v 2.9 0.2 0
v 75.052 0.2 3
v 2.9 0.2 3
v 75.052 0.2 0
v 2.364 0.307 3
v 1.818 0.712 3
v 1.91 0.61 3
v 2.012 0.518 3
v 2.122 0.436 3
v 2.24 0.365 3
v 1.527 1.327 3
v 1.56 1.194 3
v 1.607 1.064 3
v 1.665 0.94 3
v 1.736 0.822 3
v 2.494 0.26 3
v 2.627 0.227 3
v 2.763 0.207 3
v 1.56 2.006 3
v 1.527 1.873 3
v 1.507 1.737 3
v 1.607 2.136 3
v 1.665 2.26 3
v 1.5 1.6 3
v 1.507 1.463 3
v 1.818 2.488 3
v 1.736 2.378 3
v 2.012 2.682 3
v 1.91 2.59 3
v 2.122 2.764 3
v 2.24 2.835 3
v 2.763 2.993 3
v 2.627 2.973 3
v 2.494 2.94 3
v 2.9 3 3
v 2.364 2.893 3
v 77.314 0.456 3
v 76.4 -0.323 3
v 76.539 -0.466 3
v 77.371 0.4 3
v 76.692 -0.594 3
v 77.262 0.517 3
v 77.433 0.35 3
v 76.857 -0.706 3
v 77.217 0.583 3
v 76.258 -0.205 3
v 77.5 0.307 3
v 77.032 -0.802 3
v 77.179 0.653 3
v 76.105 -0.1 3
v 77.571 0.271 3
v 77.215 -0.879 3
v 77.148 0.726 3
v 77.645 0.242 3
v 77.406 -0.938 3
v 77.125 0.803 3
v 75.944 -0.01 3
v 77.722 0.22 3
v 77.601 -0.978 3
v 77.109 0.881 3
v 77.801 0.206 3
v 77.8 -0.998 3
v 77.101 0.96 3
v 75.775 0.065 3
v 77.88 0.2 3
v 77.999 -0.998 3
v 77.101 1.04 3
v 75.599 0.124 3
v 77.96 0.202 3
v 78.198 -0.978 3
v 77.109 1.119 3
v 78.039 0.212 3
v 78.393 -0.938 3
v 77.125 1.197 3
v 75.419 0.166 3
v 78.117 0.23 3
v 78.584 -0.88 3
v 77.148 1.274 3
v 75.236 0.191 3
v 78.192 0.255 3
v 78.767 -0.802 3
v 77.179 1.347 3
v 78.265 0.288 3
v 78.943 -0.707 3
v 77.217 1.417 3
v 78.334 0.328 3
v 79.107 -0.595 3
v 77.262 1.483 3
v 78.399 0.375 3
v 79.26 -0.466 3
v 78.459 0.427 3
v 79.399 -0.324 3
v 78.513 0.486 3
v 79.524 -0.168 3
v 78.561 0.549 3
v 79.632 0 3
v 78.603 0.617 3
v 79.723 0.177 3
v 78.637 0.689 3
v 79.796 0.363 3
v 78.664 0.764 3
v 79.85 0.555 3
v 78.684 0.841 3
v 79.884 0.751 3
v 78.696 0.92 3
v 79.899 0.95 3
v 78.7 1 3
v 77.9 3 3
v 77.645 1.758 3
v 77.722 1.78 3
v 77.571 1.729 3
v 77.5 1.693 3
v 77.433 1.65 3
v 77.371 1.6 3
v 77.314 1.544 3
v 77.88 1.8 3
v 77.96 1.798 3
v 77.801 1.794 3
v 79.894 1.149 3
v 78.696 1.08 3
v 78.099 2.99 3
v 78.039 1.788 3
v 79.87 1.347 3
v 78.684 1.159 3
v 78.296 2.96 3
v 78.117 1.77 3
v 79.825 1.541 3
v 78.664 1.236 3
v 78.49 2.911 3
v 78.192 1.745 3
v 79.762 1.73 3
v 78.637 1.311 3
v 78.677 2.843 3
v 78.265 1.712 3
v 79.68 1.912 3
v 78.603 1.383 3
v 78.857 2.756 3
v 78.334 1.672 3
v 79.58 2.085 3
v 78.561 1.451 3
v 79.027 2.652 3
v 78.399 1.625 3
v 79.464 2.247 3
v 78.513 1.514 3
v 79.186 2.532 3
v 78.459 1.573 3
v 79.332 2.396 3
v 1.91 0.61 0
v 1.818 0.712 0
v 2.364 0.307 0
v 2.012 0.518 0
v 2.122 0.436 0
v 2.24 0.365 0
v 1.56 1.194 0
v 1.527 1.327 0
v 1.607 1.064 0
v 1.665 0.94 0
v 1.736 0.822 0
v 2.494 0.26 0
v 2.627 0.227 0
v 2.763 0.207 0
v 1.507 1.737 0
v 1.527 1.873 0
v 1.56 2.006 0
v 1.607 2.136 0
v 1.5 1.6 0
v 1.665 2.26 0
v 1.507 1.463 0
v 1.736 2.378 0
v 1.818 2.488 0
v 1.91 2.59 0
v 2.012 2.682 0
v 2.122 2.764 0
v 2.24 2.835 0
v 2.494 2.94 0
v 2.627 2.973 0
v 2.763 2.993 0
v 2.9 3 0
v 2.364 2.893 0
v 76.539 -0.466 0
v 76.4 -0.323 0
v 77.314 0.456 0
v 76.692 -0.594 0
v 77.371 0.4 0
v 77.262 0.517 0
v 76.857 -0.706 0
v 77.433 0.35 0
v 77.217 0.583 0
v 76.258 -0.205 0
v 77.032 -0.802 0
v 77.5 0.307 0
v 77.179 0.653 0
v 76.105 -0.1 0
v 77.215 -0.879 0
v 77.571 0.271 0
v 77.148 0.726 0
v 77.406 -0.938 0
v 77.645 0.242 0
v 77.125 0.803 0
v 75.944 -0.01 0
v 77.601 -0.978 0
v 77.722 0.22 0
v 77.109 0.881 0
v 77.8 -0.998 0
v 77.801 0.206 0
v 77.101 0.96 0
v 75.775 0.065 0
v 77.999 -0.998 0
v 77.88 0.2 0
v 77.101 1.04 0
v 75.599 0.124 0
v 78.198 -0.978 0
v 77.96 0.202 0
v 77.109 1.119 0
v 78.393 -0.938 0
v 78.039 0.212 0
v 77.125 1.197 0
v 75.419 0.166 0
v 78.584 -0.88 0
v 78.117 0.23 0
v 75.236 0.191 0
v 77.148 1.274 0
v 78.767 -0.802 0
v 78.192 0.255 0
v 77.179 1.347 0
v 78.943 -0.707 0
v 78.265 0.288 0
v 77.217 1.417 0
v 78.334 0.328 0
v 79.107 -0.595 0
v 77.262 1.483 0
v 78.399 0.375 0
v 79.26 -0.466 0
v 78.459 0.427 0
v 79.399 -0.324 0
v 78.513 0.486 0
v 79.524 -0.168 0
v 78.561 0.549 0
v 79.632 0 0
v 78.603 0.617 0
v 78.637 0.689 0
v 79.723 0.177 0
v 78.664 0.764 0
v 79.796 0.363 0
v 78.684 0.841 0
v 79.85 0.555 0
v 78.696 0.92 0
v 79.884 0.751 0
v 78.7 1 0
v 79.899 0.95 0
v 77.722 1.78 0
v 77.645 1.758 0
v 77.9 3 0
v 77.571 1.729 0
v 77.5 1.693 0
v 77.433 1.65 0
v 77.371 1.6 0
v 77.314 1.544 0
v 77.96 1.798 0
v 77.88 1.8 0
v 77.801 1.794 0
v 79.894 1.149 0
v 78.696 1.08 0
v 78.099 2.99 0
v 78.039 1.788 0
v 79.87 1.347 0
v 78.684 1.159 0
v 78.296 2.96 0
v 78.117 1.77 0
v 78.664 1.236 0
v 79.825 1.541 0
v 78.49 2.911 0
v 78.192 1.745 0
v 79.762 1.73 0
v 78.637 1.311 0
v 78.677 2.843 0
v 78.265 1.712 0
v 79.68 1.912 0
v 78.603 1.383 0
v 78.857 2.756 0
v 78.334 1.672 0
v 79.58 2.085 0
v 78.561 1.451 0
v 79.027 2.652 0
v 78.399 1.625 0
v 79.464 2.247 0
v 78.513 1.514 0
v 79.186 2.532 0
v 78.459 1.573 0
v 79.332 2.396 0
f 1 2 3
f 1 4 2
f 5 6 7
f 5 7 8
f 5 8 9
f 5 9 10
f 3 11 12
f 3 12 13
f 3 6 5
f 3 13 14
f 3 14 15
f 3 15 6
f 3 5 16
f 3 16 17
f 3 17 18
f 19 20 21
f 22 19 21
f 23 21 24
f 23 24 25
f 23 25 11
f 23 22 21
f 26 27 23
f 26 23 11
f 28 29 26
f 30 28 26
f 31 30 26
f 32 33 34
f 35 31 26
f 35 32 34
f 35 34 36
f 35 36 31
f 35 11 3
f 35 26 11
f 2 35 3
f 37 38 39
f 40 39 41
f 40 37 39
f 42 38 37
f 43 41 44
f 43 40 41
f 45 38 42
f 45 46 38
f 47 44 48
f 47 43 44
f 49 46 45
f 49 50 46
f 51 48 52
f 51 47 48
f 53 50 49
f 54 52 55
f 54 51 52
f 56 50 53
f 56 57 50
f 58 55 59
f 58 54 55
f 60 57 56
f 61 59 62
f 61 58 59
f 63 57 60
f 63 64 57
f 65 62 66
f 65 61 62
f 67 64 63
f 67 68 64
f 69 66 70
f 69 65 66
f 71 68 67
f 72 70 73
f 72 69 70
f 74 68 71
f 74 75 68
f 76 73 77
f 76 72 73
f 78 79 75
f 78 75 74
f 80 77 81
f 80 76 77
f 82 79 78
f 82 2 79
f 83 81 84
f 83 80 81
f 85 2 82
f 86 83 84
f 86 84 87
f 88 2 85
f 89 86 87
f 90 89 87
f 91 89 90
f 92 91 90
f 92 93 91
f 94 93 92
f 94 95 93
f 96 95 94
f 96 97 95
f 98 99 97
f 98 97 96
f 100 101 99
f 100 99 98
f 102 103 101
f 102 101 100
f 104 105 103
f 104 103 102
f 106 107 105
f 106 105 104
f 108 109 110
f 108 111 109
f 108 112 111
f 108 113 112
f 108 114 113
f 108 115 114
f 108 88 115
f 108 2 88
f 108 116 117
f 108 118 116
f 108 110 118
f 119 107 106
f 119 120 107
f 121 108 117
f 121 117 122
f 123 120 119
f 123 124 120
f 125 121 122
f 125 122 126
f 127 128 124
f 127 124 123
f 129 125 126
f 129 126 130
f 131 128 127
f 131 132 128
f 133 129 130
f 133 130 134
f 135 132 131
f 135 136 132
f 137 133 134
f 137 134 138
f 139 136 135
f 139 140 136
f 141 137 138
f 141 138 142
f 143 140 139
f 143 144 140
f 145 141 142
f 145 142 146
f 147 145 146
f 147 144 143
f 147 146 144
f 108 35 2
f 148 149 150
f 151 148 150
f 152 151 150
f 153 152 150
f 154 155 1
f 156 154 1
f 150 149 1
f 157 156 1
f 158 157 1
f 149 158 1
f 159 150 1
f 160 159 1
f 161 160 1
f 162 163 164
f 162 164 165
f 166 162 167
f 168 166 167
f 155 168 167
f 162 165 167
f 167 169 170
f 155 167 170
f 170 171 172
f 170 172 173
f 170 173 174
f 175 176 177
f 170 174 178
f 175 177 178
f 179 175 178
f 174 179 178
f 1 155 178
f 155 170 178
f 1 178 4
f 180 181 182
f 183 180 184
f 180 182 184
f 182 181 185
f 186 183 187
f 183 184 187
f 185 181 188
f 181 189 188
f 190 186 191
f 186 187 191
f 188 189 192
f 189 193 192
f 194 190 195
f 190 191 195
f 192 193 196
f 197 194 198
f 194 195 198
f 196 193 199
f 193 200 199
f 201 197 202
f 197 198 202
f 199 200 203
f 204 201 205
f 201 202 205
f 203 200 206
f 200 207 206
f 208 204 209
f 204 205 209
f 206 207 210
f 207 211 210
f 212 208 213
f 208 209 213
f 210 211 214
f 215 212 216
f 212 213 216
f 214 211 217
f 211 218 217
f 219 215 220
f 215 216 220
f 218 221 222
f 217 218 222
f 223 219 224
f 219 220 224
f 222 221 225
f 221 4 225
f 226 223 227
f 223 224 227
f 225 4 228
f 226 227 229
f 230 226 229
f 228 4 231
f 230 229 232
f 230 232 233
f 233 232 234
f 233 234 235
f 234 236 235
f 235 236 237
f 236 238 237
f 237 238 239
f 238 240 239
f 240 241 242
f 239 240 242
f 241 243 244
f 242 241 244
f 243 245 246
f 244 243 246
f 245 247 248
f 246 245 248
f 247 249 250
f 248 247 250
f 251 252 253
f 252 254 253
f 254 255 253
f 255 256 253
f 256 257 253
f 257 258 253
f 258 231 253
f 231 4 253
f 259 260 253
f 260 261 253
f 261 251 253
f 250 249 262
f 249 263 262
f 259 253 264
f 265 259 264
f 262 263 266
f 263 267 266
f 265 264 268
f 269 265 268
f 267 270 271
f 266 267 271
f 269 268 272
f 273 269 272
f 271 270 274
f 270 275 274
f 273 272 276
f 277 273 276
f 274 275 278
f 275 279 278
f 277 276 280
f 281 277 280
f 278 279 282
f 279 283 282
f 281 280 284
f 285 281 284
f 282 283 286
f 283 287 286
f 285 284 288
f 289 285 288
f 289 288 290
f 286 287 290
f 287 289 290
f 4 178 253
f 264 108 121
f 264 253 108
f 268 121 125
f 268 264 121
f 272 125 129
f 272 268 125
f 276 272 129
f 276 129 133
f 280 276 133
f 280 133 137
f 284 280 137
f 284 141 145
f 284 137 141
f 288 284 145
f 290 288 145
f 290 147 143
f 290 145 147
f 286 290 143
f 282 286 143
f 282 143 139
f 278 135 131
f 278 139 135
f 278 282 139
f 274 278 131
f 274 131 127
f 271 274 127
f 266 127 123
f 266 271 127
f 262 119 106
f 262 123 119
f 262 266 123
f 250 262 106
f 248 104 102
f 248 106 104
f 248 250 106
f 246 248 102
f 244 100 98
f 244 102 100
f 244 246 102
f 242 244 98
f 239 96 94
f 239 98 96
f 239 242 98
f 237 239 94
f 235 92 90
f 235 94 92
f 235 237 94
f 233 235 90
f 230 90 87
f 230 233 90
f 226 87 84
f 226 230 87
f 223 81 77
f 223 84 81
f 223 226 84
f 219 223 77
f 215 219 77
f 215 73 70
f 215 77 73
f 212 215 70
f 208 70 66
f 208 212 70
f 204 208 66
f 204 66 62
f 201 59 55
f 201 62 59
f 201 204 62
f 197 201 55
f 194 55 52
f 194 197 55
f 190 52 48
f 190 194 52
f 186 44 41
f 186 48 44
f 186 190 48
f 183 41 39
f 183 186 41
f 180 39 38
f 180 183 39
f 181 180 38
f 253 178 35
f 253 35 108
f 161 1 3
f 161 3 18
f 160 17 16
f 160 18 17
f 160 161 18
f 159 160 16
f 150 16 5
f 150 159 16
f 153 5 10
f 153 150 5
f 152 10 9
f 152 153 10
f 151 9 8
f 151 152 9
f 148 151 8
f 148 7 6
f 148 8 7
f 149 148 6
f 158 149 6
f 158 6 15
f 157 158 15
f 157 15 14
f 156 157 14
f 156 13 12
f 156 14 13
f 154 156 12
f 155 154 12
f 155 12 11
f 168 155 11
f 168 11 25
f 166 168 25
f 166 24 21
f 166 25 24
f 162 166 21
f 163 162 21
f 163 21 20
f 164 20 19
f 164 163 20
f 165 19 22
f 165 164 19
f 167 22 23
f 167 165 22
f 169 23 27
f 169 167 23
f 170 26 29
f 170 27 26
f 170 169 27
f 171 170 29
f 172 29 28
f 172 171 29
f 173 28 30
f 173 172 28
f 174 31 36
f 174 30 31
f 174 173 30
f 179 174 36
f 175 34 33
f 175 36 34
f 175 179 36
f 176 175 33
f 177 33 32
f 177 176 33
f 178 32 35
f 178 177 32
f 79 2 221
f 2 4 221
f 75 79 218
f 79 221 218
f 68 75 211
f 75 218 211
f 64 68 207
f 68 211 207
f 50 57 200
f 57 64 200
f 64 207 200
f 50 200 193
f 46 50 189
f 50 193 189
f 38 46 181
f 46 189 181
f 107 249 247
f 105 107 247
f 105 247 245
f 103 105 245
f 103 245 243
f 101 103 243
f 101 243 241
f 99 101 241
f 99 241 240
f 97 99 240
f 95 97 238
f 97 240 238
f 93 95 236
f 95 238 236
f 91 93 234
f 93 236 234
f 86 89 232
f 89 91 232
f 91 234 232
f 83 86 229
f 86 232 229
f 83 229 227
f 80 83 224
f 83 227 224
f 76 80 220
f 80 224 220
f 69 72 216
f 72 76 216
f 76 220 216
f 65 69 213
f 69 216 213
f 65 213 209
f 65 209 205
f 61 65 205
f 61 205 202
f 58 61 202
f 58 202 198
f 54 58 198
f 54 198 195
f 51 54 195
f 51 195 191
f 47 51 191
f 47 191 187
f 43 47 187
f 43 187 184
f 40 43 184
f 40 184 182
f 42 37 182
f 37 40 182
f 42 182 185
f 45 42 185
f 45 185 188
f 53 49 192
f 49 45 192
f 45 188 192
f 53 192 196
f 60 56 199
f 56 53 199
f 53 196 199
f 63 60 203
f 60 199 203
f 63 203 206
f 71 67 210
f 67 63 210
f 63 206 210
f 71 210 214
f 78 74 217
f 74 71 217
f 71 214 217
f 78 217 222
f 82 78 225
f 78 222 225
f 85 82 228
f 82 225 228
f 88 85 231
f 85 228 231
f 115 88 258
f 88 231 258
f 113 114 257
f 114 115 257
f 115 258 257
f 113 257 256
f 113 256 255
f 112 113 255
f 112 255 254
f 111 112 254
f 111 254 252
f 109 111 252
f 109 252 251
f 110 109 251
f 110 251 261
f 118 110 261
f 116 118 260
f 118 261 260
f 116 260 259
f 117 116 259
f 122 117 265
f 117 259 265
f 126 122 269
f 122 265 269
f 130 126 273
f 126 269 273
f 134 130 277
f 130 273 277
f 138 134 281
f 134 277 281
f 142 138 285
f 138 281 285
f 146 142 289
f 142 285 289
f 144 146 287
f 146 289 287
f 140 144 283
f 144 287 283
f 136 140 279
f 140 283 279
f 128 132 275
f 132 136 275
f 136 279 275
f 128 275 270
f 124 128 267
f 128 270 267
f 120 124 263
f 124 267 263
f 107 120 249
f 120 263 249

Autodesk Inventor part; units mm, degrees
ref_plane "YZ Plane" through (0, 0, 0) normal (1, 0, 0) x (0, 1, 0)
ref_plane "XZ Plane" through (0, 0, 0) normal (0, 1, 0) x (-1, 0, 0)
ref_plane "XY Plane" through (0, 0, 0) normal (0, 0, 1) x (1, 0, 0)
ref_plane "Work Plane1" through (0, 0, 0) normal (0, 0, 1) x (1, 0, 0)
sketch "Sketch1" plane through (0, 0, 0) normal (0, 0, 1) x (1, 0, 0)
  circle A0 centre (77.9, 1) radius 0.8 projected
  line L0 (79.585, 1.6) -> (78.4292, 1.6) construction
  line L1 (2.9, 3) -> (77.9, 3)
  arc A1 (2.9, 3) -> (2.9, 0.2) centre (2.9, 1.6) ccw
  arc A2 (76.4, -0.3229) -> (77.9, 3) centre (77.9, 1) ccw
  line L2 (75.0516, 0.2) -> (2.9, 0.2)
  arc A3 (76.4, -0.3229) -> (75.0516, 0.2) centre (75.0516, -1.8) ccw
  point P0 (0, 0)
  point P1 (41.1836, 1.6)
  point P2 (74.7858, 0.2)
  dimension "d1" = 4
  dimension "d2" = 2.8
  dimension "d4" = 2
  dimension "d5" = 75
  dimension "d6" = 1.5
extrude "Extrusion1" add sketch "Sketch1" along normal blind 3
properties part number "flip-stand-bottom"
